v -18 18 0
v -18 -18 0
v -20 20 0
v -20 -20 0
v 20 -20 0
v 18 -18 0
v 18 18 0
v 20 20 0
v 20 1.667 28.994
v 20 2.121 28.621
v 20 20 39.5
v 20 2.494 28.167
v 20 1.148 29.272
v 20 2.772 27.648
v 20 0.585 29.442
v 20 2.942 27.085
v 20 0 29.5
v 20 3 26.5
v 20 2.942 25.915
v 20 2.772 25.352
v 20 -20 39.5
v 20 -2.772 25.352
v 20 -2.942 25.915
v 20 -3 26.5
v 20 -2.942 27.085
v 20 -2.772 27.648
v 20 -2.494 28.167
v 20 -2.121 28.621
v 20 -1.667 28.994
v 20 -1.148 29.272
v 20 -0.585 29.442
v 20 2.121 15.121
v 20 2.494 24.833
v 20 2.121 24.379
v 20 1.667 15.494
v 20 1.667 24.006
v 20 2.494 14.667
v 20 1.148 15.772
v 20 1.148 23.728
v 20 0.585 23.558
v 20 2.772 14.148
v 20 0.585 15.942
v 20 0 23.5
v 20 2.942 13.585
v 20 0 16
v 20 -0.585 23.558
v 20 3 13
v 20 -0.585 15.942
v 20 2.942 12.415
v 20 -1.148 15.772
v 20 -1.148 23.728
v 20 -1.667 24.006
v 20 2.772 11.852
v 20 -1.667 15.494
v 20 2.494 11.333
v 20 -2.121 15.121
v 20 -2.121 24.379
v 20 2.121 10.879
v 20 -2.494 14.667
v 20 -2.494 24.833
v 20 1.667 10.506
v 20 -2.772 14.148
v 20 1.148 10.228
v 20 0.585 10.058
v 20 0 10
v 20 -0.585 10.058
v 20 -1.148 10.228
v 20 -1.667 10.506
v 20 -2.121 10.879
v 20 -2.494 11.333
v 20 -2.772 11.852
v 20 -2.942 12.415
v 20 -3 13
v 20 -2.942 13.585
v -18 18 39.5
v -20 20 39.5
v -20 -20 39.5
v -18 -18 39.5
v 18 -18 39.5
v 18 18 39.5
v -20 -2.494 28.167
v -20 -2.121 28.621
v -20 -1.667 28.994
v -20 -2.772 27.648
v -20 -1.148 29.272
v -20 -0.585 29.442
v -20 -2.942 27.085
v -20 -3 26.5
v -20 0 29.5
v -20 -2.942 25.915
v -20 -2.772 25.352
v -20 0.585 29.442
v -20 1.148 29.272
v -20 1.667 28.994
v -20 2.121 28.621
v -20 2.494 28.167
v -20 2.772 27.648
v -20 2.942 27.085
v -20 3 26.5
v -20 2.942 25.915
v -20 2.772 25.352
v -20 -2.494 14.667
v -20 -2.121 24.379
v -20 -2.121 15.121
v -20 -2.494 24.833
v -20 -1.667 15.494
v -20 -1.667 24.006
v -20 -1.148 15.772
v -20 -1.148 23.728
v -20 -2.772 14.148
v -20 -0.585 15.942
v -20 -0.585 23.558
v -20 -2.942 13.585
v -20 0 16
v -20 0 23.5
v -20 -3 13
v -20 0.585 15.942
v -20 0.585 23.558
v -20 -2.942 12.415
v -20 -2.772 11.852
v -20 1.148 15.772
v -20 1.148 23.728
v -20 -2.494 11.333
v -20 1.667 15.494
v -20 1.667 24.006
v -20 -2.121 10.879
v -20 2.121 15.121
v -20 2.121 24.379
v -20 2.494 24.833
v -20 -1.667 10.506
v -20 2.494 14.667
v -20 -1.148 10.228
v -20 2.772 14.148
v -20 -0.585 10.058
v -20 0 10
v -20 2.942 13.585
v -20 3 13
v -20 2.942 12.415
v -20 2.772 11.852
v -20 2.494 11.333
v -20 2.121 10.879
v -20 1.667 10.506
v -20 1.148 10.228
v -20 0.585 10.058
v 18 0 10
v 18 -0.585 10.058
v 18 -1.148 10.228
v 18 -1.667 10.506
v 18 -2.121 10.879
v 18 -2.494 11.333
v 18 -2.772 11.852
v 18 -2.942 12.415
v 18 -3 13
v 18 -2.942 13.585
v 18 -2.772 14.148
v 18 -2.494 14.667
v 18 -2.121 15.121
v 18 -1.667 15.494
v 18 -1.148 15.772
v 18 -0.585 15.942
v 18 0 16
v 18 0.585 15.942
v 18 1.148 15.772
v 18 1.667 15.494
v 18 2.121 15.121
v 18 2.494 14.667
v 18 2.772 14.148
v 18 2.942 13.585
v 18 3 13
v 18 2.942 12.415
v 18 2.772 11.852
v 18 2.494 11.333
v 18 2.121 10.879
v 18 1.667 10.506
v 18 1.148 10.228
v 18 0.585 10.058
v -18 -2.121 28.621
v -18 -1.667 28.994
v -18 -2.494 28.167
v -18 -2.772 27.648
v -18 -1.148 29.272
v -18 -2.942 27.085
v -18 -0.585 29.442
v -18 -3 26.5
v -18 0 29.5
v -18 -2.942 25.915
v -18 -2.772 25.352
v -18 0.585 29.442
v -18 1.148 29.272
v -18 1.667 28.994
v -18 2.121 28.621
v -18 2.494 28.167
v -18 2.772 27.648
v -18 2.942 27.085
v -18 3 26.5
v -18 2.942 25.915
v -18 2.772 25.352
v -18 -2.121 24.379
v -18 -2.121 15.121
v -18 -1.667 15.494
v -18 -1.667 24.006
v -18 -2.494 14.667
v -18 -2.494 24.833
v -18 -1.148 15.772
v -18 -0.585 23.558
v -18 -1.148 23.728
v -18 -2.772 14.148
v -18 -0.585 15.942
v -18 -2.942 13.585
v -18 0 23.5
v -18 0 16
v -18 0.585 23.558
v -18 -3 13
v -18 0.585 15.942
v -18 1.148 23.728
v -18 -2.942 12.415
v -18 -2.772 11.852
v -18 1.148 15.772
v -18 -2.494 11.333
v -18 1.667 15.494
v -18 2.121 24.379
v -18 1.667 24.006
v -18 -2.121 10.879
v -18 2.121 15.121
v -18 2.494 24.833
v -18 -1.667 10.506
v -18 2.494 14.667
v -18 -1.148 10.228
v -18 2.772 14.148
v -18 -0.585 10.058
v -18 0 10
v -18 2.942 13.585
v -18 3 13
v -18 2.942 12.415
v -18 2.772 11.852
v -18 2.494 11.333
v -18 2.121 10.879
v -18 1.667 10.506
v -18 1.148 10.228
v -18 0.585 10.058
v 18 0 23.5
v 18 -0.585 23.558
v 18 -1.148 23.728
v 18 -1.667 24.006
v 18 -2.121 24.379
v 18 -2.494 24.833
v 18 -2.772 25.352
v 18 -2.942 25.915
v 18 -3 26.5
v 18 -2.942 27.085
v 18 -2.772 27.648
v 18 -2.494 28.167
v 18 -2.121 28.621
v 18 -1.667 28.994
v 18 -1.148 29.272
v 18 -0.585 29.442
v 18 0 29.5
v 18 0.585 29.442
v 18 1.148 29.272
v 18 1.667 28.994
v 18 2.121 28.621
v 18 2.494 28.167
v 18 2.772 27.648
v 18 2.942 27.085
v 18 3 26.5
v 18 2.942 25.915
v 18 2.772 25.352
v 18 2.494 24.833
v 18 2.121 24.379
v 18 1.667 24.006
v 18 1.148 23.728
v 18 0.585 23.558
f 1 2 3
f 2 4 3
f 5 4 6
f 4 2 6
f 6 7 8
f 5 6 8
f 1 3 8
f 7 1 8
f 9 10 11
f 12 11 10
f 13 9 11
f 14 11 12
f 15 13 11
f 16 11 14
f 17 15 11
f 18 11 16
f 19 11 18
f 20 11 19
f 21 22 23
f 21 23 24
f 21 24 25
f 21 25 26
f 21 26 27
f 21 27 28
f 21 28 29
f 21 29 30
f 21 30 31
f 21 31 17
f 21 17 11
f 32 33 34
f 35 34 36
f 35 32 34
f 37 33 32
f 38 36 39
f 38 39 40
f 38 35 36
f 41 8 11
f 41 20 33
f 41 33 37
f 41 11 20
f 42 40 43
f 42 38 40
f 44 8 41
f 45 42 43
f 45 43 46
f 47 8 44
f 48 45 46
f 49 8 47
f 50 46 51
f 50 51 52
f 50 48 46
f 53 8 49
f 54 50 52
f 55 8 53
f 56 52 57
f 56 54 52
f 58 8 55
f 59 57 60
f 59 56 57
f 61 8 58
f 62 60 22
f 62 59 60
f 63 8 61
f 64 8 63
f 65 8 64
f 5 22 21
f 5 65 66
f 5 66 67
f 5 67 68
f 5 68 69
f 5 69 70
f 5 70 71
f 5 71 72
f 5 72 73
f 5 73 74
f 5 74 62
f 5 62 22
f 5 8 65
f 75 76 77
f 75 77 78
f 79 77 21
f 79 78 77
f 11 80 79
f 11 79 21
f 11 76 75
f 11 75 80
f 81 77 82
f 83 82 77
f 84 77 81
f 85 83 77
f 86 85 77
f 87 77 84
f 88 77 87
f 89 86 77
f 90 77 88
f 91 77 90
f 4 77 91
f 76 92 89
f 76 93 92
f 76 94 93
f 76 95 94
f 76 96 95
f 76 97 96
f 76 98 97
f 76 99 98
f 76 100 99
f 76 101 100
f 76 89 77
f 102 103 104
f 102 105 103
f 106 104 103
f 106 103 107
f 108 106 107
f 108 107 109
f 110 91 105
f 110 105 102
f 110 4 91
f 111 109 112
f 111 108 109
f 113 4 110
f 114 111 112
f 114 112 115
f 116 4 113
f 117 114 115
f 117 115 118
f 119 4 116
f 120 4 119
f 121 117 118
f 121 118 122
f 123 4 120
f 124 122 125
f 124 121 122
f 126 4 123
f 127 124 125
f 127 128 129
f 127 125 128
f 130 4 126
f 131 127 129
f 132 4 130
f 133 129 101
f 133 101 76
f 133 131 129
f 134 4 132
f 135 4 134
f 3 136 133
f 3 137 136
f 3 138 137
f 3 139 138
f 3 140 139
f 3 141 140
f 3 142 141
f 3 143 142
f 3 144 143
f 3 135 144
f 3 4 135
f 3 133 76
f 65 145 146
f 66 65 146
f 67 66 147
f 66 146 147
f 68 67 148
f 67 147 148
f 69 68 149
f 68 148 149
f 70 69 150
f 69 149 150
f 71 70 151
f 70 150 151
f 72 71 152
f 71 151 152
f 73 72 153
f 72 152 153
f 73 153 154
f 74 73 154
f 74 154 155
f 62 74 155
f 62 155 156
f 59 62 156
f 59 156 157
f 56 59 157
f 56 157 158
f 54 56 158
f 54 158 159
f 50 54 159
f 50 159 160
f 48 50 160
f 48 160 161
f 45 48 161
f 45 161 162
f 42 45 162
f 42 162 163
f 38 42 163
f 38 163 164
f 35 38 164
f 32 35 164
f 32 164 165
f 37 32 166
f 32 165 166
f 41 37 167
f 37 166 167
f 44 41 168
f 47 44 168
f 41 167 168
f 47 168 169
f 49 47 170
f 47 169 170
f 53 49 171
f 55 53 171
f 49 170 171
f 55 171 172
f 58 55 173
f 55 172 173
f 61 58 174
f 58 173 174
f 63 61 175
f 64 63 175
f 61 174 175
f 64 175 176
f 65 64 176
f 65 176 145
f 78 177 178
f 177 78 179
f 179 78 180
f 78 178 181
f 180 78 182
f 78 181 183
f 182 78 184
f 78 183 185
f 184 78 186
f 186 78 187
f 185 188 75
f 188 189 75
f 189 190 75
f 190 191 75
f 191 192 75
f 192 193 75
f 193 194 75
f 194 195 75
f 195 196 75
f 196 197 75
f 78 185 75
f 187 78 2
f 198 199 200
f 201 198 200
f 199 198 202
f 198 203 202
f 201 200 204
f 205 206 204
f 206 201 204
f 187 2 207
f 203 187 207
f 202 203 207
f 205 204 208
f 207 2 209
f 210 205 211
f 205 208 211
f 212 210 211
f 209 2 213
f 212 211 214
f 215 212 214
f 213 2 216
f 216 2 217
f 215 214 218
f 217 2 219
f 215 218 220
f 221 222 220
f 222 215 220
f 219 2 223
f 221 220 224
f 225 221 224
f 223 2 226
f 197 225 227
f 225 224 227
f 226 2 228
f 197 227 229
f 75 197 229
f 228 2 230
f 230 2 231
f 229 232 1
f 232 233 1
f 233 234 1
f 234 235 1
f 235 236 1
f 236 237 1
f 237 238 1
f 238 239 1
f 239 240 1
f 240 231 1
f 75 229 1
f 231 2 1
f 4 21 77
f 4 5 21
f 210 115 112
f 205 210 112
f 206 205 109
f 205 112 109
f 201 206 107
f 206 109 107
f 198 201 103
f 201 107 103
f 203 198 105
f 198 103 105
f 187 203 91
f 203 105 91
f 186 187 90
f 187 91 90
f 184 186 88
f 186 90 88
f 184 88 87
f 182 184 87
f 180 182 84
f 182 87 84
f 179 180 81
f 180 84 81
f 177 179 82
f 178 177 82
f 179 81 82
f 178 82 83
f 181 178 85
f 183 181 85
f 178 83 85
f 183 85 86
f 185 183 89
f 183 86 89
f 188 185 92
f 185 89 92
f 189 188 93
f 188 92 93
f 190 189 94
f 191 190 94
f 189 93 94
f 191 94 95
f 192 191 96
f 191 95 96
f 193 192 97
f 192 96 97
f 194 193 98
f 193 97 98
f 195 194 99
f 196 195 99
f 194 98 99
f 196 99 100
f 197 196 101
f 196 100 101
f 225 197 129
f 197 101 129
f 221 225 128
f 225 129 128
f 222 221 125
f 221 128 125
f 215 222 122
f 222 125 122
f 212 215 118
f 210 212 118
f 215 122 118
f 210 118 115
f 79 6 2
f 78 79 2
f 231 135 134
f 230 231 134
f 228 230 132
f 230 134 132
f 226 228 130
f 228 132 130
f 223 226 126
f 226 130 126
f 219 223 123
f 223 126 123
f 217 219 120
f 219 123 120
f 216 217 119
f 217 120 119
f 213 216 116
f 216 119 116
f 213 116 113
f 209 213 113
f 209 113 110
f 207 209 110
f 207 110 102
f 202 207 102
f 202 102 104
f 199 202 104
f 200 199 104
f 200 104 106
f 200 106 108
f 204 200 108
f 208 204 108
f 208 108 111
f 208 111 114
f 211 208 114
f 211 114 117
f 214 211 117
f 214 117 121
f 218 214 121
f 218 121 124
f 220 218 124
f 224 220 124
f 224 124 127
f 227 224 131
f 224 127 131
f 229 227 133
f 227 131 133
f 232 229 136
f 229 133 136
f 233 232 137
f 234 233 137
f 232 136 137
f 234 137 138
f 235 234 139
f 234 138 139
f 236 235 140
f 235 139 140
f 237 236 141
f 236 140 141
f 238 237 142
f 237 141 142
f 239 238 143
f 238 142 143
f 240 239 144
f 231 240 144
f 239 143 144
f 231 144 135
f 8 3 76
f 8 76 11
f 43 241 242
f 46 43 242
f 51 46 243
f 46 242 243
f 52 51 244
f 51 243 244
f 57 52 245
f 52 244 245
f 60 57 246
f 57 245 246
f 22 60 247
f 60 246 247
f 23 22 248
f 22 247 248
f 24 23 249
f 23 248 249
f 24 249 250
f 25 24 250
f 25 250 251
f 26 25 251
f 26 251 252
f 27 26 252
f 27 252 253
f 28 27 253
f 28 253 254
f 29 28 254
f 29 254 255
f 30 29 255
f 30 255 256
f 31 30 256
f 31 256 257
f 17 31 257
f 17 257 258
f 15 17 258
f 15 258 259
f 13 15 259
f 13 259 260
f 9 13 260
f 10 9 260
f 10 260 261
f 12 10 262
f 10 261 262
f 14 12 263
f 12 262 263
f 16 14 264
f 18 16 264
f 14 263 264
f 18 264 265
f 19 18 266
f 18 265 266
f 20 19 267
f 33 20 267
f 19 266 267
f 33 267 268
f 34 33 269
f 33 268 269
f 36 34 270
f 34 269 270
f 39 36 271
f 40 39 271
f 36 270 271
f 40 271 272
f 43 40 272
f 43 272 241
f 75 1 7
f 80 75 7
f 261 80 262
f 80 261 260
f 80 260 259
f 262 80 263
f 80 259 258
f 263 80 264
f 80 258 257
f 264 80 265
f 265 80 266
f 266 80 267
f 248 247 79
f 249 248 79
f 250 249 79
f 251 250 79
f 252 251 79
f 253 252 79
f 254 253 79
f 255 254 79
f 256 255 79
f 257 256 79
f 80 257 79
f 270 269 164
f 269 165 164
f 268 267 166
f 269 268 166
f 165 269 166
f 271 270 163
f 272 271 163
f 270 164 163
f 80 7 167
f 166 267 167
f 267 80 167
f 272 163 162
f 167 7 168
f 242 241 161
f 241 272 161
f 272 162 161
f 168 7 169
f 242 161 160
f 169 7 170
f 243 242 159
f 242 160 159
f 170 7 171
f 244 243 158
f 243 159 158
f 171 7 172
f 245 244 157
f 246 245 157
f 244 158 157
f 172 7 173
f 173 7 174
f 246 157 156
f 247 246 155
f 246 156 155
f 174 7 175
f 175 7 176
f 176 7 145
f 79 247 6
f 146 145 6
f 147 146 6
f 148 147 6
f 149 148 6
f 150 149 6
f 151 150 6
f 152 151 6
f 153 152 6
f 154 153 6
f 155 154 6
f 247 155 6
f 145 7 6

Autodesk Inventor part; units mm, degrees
ref_plane "YZ Plane" through (0, 0, 0) normal (1, 0, 0) x (0, 1, 0)
ref_plane "XZ Plane" through (0, 0, 0) normal (0, 1, 0) x (-1, 0, 0)
ref_plane "XY Plane" through (0, 0, 0) normal (0, 0, 1) x (1, 0, 0)
sketch "スケッチ1" plane through (0, 0, 0) normal (0, 0, 1) x (1, 0, 0)
  line L0 (-18, 18) -> (18, 18)
  line L1 (18, 18) -> (18, -18)
  line L2 (18, -18) -> (-18, -18)
  line L3 (-18, -18) -> (-18, 18)
  line L4 (-18, 18) -> (18, -18) construction
  line L5 (18, 18) -> (-18, -18) construction
  line L6 (-20, 20) -> (20, 20)
  line L7 (20, 20) -> (20, -20)
  line L8 (20, -20) -> (-20, -20)
  line L9 (-20, -20) -> (-20, 20)
  line L10 (-20, 20) -> (20, -20) construction
  line L11 (20, 20) -> (-20, -20) construction
  point P0 (0, 0)
  dimension "d0" = 36
  dimension "d1" = 36
  dimension "d2" = 40
  dimension "d3" = 40
extrude "押し出し1" add sketch "スケッチ1" along normal blind 39.5
sketch "スケッチ2" plane through (20, -20, 0) normal (1, 0, 0) x (0, 0, -1)
  line L0 (0, 40) -> (-39.5, 40) projected
  line L1 (0, 40) -> (0, 0) projected
  line L2 (-39.5, 0) -> (-39.5, 40) projected
  point P0 (0, 20)
  point P1 (-13, 20)
  point P2 (-26.5, 20)
  dimension "d13" = 13.5
  dimension "d14" = 20
  dimension "d15" = 13
  dimension "d16" = 13
  dimension "d17" = 20
hole "穴1" at (20, 0, 13) at (20, 0, 26.5) direction (-1, 0, 0) diameter 6 end through all
properties part number "Square pipe" material "アルミニウム 6061"
